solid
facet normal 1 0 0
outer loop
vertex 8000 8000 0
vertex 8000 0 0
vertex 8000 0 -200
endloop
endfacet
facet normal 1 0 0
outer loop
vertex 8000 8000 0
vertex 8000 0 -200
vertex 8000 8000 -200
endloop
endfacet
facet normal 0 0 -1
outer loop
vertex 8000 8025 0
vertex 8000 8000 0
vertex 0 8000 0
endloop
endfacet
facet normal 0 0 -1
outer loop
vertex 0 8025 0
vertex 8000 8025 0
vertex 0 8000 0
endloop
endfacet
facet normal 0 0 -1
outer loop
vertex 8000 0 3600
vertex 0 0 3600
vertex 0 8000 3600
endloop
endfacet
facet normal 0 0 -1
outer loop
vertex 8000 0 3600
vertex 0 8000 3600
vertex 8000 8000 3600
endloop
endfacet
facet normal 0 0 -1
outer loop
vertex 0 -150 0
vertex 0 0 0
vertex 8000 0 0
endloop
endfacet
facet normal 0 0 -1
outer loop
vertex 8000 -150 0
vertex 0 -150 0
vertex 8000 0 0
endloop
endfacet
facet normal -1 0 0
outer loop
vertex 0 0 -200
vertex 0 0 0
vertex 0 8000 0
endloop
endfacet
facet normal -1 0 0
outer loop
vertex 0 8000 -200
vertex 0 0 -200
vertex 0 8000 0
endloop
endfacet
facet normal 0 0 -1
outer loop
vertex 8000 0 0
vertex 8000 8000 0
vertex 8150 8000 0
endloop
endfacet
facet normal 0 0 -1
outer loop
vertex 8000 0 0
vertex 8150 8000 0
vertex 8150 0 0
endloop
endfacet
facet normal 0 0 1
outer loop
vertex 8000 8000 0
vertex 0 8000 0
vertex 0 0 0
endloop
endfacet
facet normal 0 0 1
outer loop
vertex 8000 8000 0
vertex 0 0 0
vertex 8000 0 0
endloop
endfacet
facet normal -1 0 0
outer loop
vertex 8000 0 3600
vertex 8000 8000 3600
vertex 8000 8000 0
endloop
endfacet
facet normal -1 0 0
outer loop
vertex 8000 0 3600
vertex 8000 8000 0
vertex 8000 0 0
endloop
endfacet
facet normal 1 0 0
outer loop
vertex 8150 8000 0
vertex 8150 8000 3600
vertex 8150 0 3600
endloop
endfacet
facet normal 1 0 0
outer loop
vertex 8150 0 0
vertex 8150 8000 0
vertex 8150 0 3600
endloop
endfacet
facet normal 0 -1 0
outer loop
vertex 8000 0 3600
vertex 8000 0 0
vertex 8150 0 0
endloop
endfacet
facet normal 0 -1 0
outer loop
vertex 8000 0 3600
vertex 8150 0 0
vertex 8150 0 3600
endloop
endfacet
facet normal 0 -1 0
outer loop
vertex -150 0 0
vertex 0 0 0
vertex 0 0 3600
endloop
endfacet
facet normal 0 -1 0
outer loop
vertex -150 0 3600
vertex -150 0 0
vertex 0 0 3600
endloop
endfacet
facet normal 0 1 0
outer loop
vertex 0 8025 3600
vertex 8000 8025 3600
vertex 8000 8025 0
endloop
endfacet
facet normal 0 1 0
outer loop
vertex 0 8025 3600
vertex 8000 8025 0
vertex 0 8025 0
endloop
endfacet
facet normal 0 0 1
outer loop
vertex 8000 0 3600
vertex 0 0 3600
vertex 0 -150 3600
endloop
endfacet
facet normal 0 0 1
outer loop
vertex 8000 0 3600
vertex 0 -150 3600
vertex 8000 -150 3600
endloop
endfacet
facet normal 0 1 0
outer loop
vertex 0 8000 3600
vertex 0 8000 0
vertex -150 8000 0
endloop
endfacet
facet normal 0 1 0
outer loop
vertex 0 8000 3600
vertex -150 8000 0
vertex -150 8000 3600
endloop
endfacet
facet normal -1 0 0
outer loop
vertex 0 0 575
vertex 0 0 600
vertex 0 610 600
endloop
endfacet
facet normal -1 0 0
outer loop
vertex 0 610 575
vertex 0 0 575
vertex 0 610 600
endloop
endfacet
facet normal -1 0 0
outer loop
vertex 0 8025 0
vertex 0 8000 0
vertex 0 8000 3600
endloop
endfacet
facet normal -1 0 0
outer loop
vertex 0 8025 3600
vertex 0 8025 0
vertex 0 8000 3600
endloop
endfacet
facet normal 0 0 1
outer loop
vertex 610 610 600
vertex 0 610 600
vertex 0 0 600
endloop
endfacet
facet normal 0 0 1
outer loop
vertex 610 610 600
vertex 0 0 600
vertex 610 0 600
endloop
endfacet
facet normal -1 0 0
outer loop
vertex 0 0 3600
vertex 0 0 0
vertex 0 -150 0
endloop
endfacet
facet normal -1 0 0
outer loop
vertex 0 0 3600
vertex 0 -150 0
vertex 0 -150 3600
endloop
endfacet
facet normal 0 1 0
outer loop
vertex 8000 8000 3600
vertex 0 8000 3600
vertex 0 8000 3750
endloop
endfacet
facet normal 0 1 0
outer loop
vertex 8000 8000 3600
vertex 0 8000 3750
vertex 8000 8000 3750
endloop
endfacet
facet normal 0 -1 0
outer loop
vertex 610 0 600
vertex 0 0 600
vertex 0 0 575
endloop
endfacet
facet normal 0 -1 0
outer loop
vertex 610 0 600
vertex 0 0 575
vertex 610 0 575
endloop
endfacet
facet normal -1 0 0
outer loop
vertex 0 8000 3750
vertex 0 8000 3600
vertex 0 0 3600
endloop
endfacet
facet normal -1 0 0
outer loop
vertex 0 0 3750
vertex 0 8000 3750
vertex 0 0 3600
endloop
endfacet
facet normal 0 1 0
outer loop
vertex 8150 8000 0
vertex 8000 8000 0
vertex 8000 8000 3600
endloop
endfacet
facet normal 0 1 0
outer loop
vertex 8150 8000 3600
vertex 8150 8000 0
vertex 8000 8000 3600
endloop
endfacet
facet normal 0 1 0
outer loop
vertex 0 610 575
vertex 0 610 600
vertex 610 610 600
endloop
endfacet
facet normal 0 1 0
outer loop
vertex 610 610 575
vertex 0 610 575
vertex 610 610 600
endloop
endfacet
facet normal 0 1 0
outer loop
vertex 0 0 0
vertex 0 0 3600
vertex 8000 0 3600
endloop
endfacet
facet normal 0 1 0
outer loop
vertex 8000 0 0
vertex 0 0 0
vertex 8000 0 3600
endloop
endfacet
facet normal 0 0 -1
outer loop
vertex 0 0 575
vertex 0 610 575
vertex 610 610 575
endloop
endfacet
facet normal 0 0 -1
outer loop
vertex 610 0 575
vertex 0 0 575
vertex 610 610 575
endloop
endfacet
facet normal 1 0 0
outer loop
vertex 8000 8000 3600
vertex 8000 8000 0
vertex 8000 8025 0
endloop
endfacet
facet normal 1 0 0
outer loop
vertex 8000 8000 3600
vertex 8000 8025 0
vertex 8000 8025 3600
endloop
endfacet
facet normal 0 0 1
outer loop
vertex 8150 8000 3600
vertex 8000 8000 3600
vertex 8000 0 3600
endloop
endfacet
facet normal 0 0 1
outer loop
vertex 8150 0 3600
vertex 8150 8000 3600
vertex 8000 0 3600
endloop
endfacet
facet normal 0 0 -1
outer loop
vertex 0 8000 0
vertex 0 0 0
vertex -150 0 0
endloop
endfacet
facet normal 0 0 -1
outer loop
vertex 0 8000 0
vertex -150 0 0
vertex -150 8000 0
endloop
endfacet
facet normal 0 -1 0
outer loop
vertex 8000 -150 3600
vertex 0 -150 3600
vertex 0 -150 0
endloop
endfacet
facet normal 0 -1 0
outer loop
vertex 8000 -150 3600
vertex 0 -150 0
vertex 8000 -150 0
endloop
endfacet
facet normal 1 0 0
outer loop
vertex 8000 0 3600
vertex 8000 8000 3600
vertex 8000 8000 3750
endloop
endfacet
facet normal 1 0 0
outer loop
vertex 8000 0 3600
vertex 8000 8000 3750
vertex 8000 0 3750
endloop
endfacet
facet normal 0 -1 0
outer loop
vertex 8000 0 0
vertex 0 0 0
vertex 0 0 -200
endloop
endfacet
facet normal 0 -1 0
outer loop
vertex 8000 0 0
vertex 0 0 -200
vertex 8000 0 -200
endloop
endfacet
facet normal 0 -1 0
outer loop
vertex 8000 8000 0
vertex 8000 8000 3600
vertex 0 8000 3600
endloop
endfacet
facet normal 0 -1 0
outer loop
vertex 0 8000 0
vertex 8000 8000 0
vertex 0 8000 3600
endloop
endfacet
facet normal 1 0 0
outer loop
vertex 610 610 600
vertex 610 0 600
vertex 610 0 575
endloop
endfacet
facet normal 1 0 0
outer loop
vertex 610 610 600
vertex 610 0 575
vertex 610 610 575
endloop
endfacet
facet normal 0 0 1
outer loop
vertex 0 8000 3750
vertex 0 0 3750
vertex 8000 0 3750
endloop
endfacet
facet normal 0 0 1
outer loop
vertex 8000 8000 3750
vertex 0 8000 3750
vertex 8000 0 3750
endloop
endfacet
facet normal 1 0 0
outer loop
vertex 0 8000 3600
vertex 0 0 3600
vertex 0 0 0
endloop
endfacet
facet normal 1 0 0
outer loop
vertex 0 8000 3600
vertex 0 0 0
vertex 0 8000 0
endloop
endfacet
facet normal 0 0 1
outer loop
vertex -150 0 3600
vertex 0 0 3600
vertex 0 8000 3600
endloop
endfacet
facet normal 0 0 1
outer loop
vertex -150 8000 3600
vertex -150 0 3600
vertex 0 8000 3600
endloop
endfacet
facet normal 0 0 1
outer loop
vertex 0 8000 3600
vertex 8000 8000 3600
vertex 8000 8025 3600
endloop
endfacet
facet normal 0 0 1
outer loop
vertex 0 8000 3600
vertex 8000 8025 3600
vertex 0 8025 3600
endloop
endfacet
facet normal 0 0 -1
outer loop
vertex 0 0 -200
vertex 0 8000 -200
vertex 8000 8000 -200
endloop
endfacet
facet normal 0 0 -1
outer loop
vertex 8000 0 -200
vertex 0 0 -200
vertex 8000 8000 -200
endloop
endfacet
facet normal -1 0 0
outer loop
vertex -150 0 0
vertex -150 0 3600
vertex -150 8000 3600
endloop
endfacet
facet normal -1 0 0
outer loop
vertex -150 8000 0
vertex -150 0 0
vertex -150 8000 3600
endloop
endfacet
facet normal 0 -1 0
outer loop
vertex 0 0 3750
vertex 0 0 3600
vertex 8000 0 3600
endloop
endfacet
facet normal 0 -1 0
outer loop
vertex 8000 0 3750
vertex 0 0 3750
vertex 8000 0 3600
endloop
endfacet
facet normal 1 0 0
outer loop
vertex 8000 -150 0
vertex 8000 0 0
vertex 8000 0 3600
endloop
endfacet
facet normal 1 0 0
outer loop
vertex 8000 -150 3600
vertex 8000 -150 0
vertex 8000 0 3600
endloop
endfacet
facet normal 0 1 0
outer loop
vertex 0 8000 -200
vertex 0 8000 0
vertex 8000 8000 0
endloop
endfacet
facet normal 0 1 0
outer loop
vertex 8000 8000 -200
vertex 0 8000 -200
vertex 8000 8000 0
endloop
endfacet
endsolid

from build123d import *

# Parameters (mm, degrees)
F1_W      = 8000
F1_H      = 3600
F8_DEPTH  = 150
F2_W      = 8000
F2_H      = 3600
F9_DEPTH  = 150
F0_W      = 8000
F0_H      = 8000
F10_DEPTH = 200
F11_W     = 8000
F11_H     = 3600
F14_DEPTH = 150
F12_W     = 8000
F12_H     = 3600
F15_DEPTH = 25
F13_W     = 8000
F13_H     = 8000
F16_DEPTH = 150
F7_W      = 610
F7_H      = 610
F17_DEPTH = 25


with BuildPart() as f8:
    # F1 (on Right) → F8 (new body)
    with BuildSketch(Plane.YZ):
        with Locations((4000, 1800)):
            Rectangle(F1_W, F1_H)
    extrude(amount=-F8_DEPTH)


with BuildPart() as f9:
    # F2 (on Front) → F9 (new body)
    with BuildSketch(Plane.XZ):
        with Locations((4000, 1800)):
            Rectangle(F2_W, F2_H)
    extrude(amount=F9_DEPTH)


with BuildPart() as f10:
    # F0 (on Top) → F10 (new body)
    with BuildSketch(Plane.XY):
        with Locations((4000, 4000)):
            Rectangle(F0_W, F0_H)
    extrude(amount=-F10_DEPTH)


with BuildPart() as f14:
    # F11 (on 3pt) → F14 (new body)
    with BuildSketch(Plane(origin=(8000, 0, 0), x_dir=(0, -1, 0), z_dir=(-1, 0, 0))):
        with Locations((-4000, 1800)):
            Rectangle(F11_W, F11_H)
    extrude(amount=-F14_DEPTH)


with BuildPart() as f15:
    # F12 (on 3pt) → F15 (new body)
    with BuildSketch(Plane(origin=(0, 8000, 0), x_dir=(-1, 0, 0), z_dir=(0, 1, 0))):
        with Locations((-4000, 1800)):
            Rectangle(F12_W, F12_H)
    extrude(amount=F15_DEPTH)


with BuildPart() as f16:
    # F13 (on 3pt) → F16 (new body)
    with BuildSketch(Plane(origin=(0, 0, 3600), x_dir=(1, 0, 0), z_dir=(0, 0, -1))):
        with Locations((4000, -4000)):
            Rectangle(F13_W, F13_H)
    extrude(amount=-F16_DEPTH)


with BuildPart() as f17:
    # F7 (on offset) → F17 (new body)
    with BuildSketch(Plane.XY.offset(600)):
        with Locations((305, 305)):
            Rectangle(F7_W, F7_H)
    extrude(amount=-F17_DEPTH)


solid = Compound([f8.part, f9.part, f10.part, f14.part, f15.part, f16.part, f17.part])
